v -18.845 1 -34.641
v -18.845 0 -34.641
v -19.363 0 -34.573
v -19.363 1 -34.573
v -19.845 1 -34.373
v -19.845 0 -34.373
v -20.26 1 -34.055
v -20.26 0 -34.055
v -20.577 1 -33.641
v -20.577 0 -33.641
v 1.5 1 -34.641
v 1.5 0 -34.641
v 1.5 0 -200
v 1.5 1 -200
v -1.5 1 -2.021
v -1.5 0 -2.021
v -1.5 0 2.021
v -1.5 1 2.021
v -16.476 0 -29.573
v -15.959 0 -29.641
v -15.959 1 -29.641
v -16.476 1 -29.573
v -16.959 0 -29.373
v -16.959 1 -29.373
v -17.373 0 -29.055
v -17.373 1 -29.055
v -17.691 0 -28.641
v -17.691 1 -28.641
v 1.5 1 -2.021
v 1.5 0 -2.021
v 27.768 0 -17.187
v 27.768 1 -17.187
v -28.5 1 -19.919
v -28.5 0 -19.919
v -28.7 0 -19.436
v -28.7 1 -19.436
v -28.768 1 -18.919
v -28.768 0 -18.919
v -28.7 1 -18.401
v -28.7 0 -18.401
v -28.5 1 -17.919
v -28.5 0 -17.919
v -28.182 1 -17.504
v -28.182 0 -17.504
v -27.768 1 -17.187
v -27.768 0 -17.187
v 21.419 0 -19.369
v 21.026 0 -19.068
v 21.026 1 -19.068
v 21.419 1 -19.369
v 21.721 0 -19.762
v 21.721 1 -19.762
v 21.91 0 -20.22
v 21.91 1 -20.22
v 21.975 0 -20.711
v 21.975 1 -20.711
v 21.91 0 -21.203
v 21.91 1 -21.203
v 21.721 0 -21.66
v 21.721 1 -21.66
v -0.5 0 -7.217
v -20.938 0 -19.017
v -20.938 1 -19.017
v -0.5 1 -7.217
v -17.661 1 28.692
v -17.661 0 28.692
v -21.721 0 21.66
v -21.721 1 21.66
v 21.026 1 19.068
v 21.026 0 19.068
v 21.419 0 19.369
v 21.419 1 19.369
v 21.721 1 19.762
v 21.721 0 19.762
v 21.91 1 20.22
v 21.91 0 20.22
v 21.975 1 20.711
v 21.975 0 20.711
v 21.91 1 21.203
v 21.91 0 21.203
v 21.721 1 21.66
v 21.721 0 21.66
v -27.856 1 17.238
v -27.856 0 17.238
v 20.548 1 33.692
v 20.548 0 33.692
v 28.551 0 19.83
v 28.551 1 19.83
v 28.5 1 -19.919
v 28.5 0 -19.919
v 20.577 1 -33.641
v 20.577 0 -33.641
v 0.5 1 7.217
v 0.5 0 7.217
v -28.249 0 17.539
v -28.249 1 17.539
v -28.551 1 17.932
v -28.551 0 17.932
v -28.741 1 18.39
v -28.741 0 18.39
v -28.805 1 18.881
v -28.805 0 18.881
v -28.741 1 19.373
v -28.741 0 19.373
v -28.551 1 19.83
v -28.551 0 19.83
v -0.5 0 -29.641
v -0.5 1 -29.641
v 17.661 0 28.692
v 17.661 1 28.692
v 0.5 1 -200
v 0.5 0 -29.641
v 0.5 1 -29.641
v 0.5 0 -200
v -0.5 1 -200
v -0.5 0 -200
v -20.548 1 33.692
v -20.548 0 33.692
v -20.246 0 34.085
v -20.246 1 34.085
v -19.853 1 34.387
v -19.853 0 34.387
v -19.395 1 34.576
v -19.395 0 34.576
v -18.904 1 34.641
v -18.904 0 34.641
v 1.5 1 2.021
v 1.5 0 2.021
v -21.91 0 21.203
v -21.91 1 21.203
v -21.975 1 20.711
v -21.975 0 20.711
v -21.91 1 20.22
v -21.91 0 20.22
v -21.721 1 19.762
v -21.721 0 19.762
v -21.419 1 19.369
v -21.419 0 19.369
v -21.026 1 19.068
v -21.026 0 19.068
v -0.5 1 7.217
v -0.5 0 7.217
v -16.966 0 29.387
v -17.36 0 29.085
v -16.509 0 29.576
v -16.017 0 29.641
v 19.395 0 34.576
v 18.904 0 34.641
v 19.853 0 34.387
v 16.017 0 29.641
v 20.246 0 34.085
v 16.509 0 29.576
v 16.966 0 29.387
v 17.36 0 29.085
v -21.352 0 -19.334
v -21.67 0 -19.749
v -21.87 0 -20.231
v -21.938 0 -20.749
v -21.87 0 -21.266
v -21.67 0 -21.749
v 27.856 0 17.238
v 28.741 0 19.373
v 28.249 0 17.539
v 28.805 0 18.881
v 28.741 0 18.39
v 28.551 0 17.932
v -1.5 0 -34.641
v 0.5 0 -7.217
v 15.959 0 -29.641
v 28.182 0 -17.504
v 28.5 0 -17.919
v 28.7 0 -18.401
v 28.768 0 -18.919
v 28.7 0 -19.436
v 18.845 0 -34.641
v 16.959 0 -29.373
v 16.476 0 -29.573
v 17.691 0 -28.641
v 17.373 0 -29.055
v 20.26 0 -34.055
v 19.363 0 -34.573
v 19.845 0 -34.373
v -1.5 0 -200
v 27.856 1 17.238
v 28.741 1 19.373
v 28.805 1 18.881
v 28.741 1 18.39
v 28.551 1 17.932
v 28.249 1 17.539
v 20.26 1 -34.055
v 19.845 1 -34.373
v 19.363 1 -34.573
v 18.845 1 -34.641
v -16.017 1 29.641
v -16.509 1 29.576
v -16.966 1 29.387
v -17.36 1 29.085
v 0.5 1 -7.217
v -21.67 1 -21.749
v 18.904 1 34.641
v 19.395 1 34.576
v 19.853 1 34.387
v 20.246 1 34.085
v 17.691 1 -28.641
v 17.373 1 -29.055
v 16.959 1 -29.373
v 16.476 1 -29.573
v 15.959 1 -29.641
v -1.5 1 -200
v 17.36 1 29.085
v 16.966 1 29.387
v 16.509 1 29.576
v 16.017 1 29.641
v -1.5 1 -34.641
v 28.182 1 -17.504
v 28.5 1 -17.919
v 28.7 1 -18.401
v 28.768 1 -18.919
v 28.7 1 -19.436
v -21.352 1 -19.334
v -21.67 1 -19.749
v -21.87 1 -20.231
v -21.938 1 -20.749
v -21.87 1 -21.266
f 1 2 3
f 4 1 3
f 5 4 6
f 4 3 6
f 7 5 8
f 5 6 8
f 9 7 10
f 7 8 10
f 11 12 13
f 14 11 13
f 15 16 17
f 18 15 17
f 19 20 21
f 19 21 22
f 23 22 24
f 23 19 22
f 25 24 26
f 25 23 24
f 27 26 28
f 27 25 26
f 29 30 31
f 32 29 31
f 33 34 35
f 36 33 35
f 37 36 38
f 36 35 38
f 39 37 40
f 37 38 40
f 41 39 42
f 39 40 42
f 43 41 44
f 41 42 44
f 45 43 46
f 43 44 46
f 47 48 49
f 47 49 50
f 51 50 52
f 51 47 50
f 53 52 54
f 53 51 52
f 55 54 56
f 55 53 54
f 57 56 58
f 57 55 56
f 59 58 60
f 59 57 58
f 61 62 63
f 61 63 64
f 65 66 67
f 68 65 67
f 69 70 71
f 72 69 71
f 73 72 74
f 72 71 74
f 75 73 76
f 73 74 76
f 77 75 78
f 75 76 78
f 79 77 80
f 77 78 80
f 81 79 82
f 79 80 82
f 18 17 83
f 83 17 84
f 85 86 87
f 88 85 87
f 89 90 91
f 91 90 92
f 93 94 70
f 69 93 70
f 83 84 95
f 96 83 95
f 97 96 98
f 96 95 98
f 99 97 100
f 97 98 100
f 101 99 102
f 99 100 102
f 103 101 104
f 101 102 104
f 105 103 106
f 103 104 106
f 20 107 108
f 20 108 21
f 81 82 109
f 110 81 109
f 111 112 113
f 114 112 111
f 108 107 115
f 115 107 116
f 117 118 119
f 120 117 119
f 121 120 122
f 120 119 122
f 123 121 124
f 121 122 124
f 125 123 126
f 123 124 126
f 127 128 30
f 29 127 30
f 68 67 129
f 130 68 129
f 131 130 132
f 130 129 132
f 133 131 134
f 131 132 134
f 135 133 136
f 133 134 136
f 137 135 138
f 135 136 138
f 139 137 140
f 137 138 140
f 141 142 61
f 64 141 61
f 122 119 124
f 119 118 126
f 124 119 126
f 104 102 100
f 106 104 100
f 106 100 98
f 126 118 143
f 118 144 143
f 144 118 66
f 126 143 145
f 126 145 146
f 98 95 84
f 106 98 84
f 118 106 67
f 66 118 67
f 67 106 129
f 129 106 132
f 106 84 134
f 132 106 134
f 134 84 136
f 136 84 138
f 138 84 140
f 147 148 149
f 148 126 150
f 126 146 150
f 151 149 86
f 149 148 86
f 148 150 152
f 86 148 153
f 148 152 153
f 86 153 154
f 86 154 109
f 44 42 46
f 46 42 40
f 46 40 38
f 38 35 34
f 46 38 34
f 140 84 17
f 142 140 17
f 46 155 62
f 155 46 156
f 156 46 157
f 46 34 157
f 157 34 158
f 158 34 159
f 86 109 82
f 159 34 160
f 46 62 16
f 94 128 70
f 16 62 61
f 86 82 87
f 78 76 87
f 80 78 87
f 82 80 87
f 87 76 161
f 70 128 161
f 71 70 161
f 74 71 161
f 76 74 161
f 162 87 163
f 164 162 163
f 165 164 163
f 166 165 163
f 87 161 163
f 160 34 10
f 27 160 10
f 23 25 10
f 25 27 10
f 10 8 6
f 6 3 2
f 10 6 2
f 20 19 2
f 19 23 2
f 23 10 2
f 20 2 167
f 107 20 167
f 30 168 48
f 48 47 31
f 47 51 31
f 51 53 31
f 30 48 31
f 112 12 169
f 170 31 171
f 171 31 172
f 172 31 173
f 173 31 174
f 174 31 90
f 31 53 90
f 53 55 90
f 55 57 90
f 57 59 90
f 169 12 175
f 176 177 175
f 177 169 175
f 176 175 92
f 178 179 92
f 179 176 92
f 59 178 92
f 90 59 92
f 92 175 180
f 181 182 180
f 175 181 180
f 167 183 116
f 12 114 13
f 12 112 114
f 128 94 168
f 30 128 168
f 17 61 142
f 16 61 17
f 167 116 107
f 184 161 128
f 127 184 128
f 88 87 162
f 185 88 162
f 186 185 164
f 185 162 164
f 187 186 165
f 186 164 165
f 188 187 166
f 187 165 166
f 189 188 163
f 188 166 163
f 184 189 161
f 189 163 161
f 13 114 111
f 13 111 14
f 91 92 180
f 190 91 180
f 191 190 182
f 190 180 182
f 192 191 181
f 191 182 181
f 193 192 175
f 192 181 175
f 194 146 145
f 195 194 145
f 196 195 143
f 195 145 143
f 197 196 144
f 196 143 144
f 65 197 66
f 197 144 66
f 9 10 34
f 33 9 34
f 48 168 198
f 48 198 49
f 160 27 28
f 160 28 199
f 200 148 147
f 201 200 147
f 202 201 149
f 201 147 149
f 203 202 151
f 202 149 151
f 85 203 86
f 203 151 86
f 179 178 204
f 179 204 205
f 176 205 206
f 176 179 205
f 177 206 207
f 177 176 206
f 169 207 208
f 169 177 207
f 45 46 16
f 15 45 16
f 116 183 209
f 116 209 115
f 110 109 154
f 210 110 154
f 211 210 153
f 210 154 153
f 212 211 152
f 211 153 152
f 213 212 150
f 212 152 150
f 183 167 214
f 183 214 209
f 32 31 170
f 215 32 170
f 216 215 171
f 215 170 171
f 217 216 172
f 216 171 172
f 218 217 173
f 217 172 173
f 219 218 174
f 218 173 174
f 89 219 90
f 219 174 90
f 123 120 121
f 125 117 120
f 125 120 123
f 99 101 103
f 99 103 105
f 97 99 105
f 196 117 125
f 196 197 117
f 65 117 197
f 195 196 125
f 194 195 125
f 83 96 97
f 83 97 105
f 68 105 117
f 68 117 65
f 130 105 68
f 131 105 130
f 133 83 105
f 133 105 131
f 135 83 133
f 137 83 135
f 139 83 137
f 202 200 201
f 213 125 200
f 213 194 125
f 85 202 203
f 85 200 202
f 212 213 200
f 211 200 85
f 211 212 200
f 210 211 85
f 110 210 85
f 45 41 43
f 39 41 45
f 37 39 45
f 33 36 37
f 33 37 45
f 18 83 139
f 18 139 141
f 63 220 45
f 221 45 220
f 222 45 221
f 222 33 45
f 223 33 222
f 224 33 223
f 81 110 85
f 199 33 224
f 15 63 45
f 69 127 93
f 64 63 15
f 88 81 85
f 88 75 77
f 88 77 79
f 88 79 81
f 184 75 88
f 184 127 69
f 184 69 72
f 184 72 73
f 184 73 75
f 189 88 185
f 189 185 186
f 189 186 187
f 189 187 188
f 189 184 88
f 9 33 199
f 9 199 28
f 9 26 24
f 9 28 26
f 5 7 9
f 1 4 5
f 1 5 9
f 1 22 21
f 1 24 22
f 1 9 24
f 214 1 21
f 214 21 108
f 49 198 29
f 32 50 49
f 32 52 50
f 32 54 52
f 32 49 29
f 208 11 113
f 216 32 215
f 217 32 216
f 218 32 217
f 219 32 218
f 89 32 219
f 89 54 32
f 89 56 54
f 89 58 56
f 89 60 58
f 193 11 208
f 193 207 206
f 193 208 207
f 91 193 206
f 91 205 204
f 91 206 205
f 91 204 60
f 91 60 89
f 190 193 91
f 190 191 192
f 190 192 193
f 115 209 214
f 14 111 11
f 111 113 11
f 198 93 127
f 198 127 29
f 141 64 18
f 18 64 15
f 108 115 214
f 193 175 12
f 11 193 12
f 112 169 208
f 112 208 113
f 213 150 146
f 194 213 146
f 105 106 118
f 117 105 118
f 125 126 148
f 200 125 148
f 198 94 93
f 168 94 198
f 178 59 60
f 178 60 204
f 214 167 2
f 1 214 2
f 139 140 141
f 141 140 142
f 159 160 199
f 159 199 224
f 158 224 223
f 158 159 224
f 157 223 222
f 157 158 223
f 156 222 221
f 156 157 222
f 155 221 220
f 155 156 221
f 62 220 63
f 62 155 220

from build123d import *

# Parameters (mm, degrees)
EXTRUDE_3_DEPTH          = 1
EXTRUDE_3_2_DEPTH        = 1
CUT_EXTRUDE_3_DEPTH      = 2
CUT_EXTRUDE_3_DEPTH_BACK = 2
SKETCH_3_W               = 1
SKETCH_3_H               = 57.878930007
SKETCH_4_W               = 1
SKETCH_4_H               = 165.358983849
EXTRUDE_4_DEPTH          = 1


with BuildPart() as part:
    # 草图2 → 凸台-拉伸3 (new body)
    with BuildSketch(Plane(origin=(0, 0, 0), x_dir=(1, 0, 0), z_dir=(0, 1, 0))):
        with BuildLine():
            Line((28.5, 19.918584287), (20.577350269, 33.641016151))
            ThreePointArc((20.577350269, 33.641016151), (19.845299462, 34.373066959), (18.845299462, 34.641016151))
            Line((18.845299462, 34.641016151), (-18.845299462, 34.641016151))
            ThreePointArc((-18.845299462, 34.641016151), (-19.845299462, 34.373066959), (-20.577350269, 33.641016151))
            Line((-20.577350269, 33.641016151), (-28.5, 19.918584287))
            ThreePointArc((-28.5, 19.918584287), (-28.699800845, 18.400946197), (-27.767949192, 17.186533479))
            Line((-27.767949192, 17.186533479), (0, 1.154700538))
            Line((0, 1.154700538), (27.767949192, 17.186533479))
            ThreePointArc((27.767949192, 17.186533479), (28.699800845, 18.400946197), (28.5, 19.918584287))
        make_face()
        with BuildLine():
            Line((15.958548116, 29.641016151), (-15.958548116, 29.641016151))
            ThreePointArc((-15.958548116, 29.641016151), (-16.958548116, 29.373066959), (-17.690598923, 28.641016151))
            Line((-17.690598923, 28.641016151), (-21.669872981, 21.748711306))
            ThreePointArc((-21.669872981, 21.748711306), (-21.869673826, 20.231073216), (-20.937822174, 19.016660498))
            Line((-20.937822174, 19.016660498), (0, 6.92820323))
            Line((0, 6.92820323), (21.026102441, 19.067629134))
            ThreePointArc((21.026102441, 19.067629134), (21.910458886, 20.220144892), (21.720841617, 21.660431039))
            Line((21.720841617, 21.660431039), (17.690598923, 28.641016151))
            ThreePointArc((17.690598923, 28.641016151), (16.958548116, 29.373066959), (15.958548116, 29.641016151))
        make_face(mode=Mode.SUBTRACT)
    extrude(amount=EXTRUDE_3_DEPTH)


with BuildPart() as body_2:
    # 草图2 → Extrude 3 2 (new body)
    with BuildSketch(Plane(origin=(0, 0, 0), x_dir=(1, 0, 0), z_dir=(0, 1, 0))):
        with BuildLine():
            Line((-28.550968636, -19.83030402), (-20.547923514, -33.691984787))
            ThreePointArc((-20.547923514, -33.691984787), (-19.853184337, -34.386723964), (-18.904152973, -34.641016151))
            Line((-18.904152973, -34.641016151), (18.904152973, -34.641016151))
            ThreePointArc((18.904152973, -34.641016151), (19.853184337, -34.386723964), (20.547923514, -33.691984787))
            Line((20.547923514, -33.691984787), (28.550968636, -19.83030402))
            ThreePointArc((28.550968636, -19.83030402), (28.740585904, -18.390017873), (27.856229459, -17.237502115))
            Line((27.856229459, -17.237502115), (0, -1.154700538))
            Line((0, -1.154700538), (-27.856229459, -17.237502115))
            ThreePointArc((-27.856229459, -17.237502115), (-28.740585904, -18.390017873), (-28.550968636, -19.83030402))
        make_face()
        with BuildLine():
            Line((-21.026102441, -19.067629134), (0, -6.92820323))
            Line((0, -6.92820323), (21.026102441, -19.067629134))
            ThreePointArc((21.026102441, -19.067629134), (21.910458886, -20.220144892), (21.720841617, -21.660431039))
            Line((21.720841617, -21.660431039), (17.661172168, -28.691984787))
            ThreePointArc((17.661172168, -28.691984787), (16.966432991, -29.386723964), (16.017401627, -29.641016151))
            Line((16.017401627, -29.641016151), (-16.017401627, -29.641016151))
            ThreePointArc((-16.017401627, -29.641016151), (-16.966432991, -29.386723964), (-17.661172168, -28.691984787))
            Line((-17.661172168, -28.691984787), (-21.720841617, -21.660431039))
            ThreePointArc((-21.720841617, -21.660431039), (-21.910458886, -20.220144892), (-21.026102441, -19.067629134))
        make_face(mode=Mode.SUBTRACT)
    extrude(amount=EXTRUDE_3_2_DEPTH)


with BuildPart() as cut_extrude_3_tool:
    # 草图3 → 切除-拉伸3 (new, two sides: drawn at the far end of the back side and taken through both)
    with BuildSketch(Plane(origin=(0, 0, 0), x_dir=(1, 0, 0), z_dir=(0, 1, 0)).offset(-CUT_EXTRUDE_3_DEPTH_BACK)):
        with Locations((0, 6.92820323)):
            Rectangle(SKETCH_3_W, SKETCH_3_H)
    extrude(amount=CUT_EXTRUDE_3_DEPTH + CUT_EXTRUDE_3_DEPTH_BACK)


with BuildPart() as part_1:
    add(part.part)

    # 切除-拉伸3: cut by cut_extrude_3_tool
    add(cut_extrude_3_tool.part, mode=Mode.SUBTRACT)



with BuildPart() as body_2_1:
    add(body_2.part)

    # 切除-拉伸3: cut by cut_extrude_3_tool
    add(cut_extrude_3_tool.part, mode=Mode.SUBTRACT)


with BuildPart() as part_2:
    add(part_1.part)

    add(body_2_1.part)  # 凸台-拉伸4 merges body 2
    # 草图4 → 凸台-拉伸4 (add)
    with BuildSketch(Plane(origin=(0, 0, 0), x_dir=(1, 0, 0), z_dir=(0, 1, 0))):
        Polygon((-1.5, 2.020725942), (-1.5, -2.020725942), (-0.5, -1.443375673), (-0.5, 1.443375673), align=None)
        Polygon((0.5, 1.443375673), (0.5, -1.443375673), (1.5, -2.020725942), (1.5, 2.020725942), align=None)
        with Locations((-1, 117.320508076)):
            Rectangle(SKETCH_4_W, SKETCH_4_H)
        with Locations((1, 117.320508076)):
            Rectangle(SKETCH_4_W, SKETCH_4_H)
    extrude(amount=EXTRUDE_4_DEPTH)


solid = part_2.part
